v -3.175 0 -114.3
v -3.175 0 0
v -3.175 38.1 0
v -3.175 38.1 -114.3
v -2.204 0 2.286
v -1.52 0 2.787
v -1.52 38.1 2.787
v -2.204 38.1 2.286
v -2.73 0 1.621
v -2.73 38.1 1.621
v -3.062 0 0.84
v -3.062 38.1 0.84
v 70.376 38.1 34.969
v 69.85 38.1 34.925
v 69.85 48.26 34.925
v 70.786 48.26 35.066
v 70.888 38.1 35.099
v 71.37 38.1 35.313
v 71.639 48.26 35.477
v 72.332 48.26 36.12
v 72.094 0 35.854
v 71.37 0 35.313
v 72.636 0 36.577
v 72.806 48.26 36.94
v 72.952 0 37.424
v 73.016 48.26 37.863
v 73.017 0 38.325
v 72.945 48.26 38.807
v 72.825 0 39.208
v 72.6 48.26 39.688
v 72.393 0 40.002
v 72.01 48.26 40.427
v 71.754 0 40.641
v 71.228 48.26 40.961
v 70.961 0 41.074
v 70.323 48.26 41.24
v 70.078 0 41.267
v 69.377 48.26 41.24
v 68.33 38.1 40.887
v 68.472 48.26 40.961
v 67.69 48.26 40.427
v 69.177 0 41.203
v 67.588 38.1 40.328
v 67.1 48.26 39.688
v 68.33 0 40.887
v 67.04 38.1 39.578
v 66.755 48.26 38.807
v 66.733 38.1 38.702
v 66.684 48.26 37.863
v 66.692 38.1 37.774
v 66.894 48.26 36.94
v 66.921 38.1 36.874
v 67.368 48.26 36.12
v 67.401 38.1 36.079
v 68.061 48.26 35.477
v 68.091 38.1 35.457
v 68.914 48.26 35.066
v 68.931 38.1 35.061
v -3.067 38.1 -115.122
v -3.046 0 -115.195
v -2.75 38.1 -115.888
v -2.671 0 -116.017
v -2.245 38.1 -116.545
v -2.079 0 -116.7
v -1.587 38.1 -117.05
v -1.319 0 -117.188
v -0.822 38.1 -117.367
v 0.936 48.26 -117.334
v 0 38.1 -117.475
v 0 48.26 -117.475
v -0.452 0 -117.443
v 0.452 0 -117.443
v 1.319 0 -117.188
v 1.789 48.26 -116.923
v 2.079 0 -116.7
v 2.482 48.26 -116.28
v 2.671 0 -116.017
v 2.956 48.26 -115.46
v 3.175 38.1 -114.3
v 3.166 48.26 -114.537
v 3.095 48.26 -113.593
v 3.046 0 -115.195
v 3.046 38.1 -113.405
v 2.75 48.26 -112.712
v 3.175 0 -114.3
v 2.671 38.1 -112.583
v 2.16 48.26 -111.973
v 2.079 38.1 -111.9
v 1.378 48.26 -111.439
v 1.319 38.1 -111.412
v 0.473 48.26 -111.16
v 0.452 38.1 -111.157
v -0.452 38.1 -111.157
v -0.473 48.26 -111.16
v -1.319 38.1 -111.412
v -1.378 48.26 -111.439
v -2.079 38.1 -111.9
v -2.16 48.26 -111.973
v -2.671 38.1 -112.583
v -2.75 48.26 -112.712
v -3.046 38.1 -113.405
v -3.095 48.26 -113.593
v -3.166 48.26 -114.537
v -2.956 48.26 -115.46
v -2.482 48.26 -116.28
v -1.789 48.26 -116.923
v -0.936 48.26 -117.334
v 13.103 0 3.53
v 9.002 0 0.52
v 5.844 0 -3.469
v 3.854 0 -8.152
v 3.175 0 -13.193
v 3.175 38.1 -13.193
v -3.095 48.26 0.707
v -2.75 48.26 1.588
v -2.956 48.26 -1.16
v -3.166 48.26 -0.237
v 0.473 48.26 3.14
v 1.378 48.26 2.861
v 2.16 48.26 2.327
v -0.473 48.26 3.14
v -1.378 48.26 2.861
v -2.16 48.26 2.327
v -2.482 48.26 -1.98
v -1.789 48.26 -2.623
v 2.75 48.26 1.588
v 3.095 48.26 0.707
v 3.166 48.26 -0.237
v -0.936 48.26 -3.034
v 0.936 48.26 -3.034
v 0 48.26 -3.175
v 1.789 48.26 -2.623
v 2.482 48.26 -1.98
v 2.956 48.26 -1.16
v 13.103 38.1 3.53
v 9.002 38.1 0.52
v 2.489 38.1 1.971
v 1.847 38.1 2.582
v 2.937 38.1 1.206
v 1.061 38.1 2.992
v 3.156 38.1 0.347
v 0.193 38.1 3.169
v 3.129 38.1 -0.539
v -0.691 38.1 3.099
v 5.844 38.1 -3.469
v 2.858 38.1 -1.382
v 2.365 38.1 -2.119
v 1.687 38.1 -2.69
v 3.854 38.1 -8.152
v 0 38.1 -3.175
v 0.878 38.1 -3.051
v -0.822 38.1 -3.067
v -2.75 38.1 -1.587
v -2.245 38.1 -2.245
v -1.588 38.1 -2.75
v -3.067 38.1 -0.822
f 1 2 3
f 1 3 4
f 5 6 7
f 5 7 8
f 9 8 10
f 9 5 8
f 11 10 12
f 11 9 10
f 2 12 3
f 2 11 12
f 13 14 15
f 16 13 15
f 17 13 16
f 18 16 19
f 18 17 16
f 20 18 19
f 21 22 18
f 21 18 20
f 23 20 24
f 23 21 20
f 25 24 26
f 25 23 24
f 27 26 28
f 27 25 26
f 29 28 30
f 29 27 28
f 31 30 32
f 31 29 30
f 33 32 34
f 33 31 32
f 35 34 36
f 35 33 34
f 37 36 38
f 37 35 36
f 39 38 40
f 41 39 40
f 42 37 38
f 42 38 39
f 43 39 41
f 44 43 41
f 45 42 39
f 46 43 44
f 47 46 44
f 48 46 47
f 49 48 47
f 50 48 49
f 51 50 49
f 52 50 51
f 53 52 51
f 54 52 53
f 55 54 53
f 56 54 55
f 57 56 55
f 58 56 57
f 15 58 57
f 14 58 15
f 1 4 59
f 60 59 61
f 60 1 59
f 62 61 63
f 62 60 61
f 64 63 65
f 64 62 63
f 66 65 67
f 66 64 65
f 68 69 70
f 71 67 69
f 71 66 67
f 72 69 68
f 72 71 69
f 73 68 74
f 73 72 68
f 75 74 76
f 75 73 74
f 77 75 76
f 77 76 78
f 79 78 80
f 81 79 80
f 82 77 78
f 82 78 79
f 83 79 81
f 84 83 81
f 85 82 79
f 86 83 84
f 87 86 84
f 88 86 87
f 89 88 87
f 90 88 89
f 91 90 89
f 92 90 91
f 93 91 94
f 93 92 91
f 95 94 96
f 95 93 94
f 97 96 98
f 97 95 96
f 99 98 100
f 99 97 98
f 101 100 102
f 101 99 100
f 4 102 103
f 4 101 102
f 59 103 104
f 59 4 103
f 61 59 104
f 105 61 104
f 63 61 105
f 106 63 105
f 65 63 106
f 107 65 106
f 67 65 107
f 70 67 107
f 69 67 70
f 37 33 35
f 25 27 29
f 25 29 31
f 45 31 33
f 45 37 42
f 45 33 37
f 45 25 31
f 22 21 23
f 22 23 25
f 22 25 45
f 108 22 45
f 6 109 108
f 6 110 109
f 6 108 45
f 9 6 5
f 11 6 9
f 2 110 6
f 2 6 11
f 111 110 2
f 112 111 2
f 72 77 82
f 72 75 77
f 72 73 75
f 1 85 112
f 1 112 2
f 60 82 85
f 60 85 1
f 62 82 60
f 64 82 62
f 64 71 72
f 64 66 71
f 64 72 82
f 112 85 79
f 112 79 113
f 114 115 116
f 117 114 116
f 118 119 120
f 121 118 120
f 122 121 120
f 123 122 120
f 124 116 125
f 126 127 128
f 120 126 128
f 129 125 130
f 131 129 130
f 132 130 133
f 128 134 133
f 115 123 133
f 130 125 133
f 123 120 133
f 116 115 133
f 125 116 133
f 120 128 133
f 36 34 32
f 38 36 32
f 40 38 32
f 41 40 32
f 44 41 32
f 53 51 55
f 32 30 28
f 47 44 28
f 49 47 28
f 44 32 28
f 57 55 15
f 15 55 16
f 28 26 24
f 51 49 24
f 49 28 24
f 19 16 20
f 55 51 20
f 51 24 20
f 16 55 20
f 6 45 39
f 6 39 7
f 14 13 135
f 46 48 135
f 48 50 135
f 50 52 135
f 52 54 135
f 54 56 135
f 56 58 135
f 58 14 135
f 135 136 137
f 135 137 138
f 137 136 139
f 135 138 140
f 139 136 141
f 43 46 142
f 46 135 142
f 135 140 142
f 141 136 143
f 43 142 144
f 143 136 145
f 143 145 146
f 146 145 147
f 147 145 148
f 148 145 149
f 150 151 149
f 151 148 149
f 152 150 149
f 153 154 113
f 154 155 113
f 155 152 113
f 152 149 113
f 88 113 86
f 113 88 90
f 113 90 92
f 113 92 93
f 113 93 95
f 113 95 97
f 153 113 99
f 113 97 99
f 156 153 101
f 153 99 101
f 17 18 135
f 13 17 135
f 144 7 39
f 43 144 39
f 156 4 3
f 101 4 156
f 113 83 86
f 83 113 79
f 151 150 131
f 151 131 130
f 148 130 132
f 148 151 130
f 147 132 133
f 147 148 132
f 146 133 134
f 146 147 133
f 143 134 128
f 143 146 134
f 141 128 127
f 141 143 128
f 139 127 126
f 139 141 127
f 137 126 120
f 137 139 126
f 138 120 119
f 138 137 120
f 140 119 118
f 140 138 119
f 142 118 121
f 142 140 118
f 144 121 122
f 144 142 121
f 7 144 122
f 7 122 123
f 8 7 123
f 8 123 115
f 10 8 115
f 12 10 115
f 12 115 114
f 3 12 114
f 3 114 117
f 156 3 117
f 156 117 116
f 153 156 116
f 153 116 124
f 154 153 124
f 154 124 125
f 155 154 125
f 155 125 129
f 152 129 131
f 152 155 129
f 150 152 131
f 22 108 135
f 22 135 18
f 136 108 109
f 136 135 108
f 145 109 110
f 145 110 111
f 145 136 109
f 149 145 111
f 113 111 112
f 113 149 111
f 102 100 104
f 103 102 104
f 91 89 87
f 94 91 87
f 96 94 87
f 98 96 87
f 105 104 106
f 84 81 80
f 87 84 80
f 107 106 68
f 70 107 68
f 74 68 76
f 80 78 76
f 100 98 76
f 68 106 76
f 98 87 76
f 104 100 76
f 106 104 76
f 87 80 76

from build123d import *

# Parameters (mm, degrees)
BOSS_EXTRUDE1_DEPTH = 38.1
SKETCH2_R           = 3.175
BOSS_EXTRUDE2_DEPTH = 48.26
FILLET1_R           = 19.05


with BuildPart() as part:
    # Sketch1 → Boss-Extrude1 (new body)
    with BuildSketch(Plane(origin=(0, 0, 0), x_dir=(1, 0, 0), z_dir=(0, 1, 0))):
        with BuildLine():
            Line((-3.175, 0), (-3.175, 114.3))
            ThreePointArc((-3.175, 114.3), (0, 117.475), (3.175, 114.3))
            Line((3.175, 114.3), (3.175, 1.884785088))
            Line((3.175, 1.884785088), (71.370355515, -35.312681556))
            ThreePointArc((71.370355515, -35.312681556), (72.637318444, -39.620355515), (68.329644485, -40.887318444))
            Line((68.329644485, -40.887318444), (-1.520355515, -2.787318444))
            ThreePointArc((-1.520355515, -2.787318444), (-2.73017891, -1.620724566), (-3.175, 0))
        make_face()
    extrude(amount=BOSS_EXTRUDE1_DEPTH)

    # Sketch2 → Boss-Extrude2 (add)
    with BuildSketch(Plane(origin=(0, 0, 0), x_dir=(-1, 0, 0), z_dir=(0, -1, 0))):
        with Locations(Location((0, 114.3, 0), (0, 0, 90))):
            Circle(SKETCH2_R)
        with Locations(Location((0, 0, 0), (0, 0, 90))):
            Circle(SKETCH2_R)
        with Locations(Location((-69.85, -38.1, 0), (0, 0, 90))):
            Circle(SKETCH2_R)
    extrude(amount=-BOSS_EXTRUDE2_DEPTH)

    # Fillet1
    fillet1_edges = [part.edges().sort_by_distance(p)[0] for p in [
        (3.175, 19.05, -1.884785088),
    ]]
    fillet(fillet1_edges, radius=FILLET1_R)


solid = part.part
